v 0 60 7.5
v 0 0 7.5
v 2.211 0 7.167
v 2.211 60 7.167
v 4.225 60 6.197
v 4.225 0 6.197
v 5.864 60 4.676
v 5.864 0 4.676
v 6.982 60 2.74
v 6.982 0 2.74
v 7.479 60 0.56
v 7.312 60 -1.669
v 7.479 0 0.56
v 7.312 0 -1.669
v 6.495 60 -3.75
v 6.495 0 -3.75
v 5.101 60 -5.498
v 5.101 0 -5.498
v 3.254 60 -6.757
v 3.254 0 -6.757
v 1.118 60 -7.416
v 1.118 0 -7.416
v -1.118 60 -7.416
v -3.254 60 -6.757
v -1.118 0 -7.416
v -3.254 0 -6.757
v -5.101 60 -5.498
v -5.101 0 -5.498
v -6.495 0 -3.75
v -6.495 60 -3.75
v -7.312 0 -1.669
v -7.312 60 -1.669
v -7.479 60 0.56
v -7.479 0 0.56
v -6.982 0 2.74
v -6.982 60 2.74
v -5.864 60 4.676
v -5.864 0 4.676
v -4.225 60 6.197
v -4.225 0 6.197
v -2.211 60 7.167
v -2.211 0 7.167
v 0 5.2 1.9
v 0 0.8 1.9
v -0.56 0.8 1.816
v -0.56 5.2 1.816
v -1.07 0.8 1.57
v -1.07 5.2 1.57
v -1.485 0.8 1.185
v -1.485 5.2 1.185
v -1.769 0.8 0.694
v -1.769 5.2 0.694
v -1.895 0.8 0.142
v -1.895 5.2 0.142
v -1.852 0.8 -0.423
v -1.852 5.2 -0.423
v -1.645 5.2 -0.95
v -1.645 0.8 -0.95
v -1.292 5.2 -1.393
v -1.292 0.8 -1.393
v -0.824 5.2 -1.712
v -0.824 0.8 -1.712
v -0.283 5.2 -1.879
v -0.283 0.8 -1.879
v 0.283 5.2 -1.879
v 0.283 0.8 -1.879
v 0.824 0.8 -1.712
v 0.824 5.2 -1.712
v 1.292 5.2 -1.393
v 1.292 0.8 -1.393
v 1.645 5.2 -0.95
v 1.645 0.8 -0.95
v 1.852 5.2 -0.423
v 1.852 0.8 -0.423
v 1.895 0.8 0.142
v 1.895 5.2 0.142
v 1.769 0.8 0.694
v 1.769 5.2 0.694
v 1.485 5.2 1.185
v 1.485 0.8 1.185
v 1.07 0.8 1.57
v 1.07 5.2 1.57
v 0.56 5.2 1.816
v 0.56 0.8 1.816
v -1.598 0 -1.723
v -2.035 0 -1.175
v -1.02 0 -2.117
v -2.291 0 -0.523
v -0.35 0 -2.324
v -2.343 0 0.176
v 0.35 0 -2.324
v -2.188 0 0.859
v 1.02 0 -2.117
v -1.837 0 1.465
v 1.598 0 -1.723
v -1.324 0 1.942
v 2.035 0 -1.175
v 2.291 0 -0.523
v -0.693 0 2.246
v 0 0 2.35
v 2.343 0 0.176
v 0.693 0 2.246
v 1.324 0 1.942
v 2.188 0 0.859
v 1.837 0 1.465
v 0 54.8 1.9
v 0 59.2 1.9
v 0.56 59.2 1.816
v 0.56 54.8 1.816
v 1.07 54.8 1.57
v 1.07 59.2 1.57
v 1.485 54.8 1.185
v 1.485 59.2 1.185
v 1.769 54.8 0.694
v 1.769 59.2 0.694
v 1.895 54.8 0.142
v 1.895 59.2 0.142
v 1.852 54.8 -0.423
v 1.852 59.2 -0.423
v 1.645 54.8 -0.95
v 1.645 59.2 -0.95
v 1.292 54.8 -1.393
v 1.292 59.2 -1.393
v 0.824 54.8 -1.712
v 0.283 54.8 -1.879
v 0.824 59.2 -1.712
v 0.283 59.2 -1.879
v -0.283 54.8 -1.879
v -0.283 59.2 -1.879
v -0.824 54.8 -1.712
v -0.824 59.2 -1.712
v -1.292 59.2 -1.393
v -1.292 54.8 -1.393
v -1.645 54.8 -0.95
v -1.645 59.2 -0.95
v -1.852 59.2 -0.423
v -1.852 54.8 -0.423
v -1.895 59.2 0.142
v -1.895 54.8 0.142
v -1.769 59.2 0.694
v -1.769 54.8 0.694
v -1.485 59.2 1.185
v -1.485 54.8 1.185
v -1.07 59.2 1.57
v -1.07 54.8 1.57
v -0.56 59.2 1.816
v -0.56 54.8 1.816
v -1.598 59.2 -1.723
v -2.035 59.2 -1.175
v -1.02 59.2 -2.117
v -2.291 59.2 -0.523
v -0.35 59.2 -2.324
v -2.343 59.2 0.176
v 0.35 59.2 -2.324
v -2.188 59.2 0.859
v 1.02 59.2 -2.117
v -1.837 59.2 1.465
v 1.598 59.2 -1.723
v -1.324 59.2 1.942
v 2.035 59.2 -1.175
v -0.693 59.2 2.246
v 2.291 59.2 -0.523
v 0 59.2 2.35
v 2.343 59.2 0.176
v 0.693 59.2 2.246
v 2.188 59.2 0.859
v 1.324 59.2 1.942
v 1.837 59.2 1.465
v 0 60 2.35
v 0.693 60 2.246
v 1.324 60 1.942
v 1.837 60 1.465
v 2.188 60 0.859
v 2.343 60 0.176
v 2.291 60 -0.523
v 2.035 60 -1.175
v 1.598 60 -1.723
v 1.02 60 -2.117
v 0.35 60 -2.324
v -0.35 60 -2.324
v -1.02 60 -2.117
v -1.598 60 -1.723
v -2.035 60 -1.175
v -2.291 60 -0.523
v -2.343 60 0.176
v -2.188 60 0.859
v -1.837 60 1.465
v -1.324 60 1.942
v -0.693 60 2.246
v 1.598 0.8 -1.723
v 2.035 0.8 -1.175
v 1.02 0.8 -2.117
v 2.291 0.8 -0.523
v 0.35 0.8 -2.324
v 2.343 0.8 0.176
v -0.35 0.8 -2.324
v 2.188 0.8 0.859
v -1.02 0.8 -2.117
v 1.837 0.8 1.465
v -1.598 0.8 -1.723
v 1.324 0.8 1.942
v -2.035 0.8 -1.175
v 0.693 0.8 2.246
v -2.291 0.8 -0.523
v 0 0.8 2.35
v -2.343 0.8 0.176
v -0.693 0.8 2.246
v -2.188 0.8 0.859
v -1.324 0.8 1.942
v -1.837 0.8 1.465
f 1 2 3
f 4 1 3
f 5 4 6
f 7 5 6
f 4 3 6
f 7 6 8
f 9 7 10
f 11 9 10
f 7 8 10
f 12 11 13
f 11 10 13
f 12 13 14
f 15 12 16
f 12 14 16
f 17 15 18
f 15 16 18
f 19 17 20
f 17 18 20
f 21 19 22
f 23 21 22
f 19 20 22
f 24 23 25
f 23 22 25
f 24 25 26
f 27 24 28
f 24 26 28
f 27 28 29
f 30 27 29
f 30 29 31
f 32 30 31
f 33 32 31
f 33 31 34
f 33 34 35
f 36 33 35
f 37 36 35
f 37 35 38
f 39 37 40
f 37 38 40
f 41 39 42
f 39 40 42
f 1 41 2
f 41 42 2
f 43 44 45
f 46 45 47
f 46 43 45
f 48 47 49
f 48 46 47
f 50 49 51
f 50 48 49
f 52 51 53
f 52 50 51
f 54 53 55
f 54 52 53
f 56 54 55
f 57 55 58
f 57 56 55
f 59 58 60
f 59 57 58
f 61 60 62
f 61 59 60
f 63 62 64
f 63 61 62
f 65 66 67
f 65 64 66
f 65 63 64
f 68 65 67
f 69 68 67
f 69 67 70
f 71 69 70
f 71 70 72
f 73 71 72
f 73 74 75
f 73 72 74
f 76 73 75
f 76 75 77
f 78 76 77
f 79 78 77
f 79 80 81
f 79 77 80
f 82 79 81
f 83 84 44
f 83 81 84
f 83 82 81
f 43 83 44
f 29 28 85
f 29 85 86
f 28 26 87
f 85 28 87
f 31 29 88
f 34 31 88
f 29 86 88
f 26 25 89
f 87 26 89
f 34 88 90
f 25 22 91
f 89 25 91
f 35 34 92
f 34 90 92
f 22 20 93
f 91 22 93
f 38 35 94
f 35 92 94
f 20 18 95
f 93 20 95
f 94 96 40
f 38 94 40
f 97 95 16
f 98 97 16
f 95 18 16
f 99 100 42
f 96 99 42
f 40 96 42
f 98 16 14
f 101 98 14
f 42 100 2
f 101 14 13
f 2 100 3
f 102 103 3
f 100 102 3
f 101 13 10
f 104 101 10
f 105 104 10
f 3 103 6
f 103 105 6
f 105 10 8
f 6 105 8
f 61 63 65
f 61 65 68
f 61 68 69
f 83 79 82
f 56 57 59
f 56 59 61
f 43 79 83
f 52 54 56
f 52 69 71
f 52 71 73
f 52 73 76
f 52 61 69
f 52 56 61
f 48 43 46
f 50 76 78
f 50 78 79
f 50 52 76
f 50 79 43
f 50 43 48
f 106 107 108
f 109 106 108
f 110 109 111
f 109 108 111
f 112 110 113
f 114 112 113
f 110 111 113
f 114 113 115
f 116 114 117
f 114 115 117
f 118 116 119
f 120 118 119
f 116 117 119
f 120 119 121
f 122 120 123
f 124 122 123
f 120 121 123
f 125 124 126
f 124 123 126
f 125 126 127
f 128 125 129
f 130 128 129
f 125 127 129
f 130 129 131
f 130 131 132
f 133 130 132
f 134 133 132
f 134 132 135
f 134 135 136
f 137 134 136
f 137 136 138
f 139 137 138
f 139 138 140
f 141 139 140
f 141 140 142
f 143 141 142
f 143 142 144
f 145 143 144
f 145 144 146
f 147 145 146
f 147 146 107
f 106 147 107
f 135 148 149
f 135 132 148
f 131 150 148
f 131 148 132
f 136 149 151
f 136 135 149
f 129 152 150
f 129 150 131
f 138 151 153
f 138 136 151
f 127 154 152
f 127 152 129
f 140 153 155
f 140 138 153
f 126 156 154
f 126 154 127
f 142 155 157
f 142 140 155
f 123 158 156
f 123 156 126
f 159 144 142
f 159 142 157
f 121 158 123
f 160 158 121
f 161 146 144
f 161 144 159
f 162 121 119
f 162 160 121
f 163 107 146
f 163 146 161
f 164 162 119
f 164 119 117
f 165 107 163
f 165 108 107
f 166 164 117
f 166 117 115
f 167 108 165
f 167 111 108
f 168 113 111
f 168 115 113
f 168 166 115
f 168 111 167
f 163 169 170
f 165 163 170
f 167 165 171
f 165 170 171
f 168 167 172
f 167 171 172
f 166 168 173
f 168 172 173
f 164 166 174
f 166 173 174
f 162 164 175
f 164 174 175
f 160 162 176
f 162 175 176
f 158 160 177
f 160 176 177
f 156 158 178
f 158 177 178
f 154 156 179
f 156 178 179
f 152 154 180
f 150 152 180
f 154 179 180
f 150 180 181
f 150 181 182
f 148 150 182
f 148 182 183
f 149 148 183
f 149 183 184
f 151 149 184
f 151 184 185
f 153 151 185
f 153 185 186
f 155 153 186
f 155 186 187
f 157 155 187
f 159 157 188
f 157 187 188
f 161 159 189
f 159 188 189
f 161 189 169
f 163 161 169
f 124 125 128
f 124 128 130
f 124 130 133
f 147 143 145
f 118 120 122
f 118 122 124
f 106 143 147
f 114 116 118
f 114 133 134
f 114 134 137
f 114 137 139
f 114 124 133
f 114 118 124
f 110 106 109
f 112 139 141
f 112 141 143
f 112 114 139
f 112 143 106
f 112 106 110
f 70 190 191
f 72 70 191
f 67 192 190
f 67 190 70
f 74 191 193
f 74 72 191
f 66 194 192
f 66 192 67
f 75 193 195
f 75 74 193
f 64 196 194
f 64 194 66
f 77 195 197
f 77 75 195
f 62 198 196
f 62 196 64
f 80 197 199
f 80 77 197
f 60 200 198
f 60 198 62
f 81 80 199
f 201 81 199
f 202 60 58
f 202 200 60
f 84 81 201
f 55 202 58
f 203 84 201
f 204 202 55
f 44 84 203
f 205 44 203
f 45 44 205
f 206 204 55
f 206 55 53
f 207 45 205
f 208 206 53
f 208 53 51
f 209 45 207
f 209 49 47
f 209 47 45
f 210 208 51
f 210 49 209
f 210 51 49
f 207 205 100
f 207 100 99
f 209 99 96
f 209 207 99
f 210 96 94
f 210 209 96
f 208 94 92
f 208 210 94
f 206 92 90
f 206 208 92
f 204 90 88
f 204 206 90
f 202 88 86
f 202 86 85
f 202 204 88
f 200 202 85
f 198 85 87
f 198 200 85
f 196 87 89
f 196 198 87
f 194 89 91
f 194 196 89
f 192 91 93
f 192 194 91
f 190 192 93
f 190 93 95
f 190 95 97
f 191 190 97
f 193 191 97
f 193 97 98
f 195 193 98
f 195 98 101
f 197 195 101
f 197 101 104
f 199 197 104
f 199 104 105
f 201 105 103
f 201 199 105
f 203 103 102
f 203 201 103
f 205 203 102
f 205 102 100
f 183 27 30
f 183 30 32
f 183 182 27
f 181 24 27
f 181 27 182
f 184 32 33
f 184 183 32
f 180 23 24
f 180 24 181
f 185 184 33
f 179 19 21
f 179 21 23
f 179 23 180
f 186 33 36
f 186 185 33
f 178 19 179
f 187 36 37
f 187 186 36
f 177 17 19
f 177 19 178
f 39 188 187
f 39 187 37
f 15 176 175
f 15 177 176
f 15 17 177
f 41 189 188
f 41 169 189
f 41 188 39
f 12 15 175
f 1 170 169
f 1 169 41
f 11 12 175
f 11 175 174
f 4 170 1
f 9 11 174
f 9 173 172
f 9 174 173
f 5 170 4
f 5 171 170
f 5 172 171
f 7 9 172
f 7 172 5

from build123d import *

# Parameters (mm, degrees)
SKETCH1_R           = 7.5
BOSS_EXTRUDE1_DEPTH = 60
SKETCH2_R           = 1.9
CUT_EXTRUDE1_DEPTH  = 5.2
CUT_EXTRUDE2_START  = -5.2
SKETCH3_R           = 1.9
CUT_EXTRUDE2_DEPTH  = 5.2
SKETCH4_R           = 2.35
CUT_EXTRUDE3_DEPTH  = 0.8
CUT_EXTRUDE4_START  = -0.8
SKETCH5_R           = 2.35
CUT_EXTRUDE4_DEPTH  = 0.8


with BuildPart() as part:
    # Sketch1 → Boss-Extrude1 (new body)
    with BuildSketch(Plane(origin=(0, 0, 0), x_dir=(1, 0, 0), z_dir=(0, 1, 0))):
        with Locations(Location((0, 0, 0), (0, 0, 270))):
            Circle(SKETCH1_R)
    extrude(amount=BOSS_EXTRUDE1_DEPTH)

    # Sketch2 → Cut-Extrude1 (cut)
    with BuildSketch(Plane(origin=(0, 60, 0), x_dir=(1, 0, 0), z_dir=(0, 1, 0))):
        with Locations(Location((0, 0, 0), (0, 0, 270))):
            Circle(SKETCH2_R)
    extrude(amount=-CUT_EXTRUDE1_DEPTH, mode=Mode.SUBTRACT)

    # Sketch3 → Cut-Extrude2 (cut)
    with BuildSketch(Plane.XZ.offset(CUT_EXTRUDE2_START)):
        with Locations(Location((0, 0, 0), (0, 0, 90))):
            Circle(SKETCH3_R)
    extrude(amount=CUT_EXTRUDE2_DEPTH, mode=Mode.SUBTRACT)

    # Sketch4 → Cut-Extrude3 (cut)
    with BuildSketch(Plane(origin=(0, 60, 0), x_dir=(1, 0, 0), z_dir=(0, 1, 0))):
        with Locations(Location((0, 0, 0), (0, 0, 270))):
            Circle(SKETCH4_R)
    extrude(amount=-CUT_EXTRUDE3_DEPTH, mode=Mode.SUBTRACT)

    # Sketch5 → Cut-Extrude4 (cut)
    with BuildSketch(Plane.XZ.offset(CUT_EXTRUDE4_START)):
        with Locations(Location((0, 0, 0), (0, 0, 90))):
            Circle(SKETCH5_R)
    extrude(amount=CUT_EXTRUDE4_DEPTH, mode=Mode.SUBTRACT)


solid = part.part
